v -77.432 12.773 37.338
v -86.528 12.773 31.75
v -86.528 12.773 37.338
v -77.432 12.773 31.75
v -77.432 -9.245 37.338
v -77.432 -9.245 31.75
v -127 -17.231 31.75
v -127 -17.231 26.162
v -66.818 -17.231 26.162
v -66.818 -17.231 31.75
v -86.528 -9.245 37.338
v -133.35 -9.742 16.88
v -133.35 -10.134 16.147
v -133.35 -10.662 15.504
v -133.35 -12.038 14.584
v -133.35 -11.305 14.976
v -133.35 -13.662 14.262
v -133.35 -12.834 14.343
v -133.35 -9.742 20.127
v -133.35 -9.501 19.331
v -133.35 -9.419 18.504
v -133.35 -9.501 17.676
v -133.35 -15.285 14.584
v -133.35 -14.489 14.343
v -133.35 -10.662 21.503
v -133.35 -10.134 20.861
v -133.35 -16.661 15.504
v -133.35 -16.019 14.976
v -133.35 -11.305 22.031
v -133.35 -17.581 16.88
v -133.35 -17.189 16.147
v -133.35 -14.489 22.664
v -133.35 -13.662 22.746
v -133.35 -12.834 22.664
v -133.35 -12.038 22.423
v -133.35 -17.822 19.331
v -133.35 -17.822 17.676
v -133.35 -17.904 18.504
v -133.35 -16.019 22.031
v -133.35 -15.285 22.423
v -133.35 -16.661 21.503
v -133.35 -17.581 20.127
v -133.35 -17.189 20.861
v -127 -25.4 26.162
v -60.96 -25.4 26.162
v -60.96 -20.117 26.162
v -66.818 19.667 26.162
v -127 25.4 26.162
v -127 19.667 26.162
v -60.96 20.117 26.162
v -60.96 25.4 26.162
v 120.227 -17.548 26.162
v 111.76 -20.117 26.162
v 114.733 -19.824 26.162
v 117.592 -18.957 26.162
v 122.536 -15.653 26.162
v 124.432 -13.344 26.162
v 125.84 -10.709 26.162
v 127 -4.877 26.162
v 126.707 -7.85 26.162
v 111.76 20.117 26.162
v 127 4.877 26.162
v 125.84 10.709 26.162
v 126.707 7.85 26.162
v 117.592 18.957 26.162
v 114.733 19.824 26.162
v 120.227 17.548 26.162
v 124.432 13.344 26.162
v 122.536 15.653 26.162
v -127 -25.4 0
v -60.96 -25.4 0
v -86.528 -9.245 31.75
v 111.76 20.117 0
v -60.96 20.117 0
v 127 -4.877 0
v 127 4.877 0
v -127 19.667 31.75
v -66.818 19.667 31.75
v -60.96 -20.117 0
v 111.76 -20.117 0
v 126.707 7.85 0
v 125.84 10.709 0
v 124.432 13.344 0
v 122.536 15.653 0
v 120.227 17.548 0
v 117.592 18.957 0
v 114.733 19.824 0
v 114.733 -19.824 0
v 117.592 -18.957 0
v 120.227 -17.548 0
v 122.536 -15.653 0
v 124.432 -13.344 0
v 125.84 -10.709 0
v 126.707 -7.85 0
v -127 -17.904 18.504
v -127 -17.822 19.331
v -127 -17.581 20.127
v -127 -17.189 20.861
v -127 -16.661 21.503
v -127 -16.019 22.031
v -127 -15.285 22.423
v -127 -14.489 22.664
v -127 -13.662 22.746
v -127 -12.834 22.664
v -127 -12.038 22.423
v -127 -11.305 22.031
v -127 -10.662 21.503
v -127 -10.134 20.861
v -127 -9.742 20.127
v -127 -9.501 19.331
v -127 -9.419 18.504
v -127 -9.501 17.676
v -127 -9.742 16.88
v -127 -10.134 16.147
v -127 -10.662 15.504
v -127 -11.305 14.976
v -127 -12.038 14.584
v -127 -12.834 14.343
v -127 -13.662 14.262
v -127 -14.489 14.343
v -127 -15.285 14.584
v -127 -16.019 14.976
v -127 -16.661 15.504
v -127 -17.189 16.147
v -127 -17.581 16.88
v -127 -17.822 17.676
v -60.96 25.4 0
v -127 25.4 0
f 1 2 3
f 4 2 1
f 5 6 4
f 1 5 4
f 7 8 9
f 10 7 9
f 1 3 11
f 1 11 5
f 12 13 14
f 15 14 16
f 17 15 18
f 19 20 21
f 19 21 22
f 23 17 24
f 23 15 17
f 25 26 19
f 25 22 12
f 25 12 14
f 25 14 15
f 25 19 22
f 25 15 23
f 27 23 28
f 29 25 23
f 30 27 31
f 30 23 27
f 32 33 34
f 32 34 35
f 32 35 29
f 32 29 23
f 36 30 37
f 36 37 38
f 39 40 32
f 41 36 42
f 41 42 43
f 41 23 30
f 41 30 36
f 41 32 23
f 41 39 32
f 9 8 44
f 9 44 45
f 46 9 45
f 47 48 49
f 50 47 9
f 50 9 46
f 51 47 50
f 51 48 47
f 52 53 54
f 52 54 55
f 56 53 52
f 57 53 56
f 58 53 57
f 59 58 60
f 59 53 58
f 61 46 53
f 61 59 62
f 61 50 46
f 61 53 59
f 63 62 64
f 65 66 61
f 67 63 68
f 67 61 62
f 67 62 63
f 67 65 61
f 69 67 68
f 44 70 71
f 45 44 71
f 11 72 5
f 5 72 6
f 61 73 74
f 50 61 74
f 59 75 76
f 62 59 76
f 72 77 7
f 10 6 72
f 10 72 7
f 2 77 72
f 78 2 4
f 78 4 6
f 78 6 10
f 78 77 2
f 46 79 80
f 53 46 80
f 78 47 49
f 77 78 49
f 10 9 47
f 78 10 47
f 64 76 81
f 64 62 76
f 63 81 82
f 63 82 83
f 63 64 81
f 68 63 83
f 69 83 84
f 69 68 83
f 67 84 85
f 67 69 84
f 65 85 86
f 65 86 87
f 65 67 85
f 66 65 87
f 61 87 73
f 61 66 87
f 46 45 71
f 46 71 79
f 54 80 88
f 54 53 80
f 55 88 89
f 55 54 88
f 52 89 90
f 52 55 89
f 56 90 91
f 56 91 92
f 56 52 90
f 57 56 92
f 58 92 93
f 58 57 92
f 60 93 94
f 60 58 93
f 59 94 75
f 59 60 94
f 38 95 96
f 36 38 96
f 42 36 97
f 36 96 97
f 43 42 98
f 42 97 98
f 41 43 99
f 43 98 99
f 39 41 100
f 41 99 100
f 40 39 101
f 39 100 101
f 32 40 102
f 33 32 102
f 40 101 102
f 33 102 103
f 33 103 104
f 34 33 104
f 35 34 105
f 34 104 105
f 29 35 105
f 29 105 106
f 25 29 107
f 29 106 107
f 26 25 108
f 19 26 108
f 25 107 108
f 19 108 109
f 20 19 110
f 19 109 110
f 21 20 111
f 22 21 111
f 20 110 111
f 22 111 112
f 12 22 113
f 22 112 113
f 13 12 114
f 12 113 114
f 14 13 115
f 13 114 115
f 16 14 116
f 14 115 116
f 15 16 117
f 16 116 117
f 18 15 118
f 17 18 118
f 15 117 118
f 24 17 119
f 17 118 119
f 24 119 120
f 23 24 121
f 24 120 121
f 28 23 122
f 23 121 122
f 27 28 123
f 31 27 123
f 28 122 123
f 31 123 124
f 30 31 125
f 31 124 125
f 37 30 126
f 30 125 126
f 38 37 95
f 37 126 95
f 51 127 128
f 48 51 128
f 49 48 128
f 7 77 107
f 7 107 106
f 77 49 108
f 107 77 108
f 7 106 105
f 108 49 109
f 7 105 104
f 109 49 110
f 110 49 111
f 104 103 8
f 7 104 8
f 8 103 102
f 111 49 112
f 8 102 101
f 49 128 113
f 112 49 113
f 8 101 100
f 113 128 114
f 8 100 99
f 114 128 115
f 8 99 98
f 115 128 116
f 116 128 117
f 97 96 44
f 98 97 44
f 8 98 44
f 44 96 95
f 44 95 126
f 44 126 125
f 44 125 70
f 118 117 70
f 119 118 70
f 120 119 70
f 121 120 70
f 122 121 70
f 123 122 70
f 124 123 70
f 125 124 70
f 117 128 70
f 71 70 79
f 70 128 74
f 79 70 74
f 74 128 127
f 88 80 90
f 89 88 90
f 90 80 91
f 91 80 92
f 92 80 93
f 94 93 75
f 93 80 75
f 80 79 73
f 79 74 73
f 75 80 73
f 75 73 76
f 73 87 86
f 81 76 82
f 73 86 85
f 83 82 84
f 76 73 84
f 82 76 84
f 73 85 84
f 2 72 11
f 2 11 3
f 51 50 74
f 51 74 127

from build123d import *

# Parameters (mm, degrees)
F1_DEPTH = 26.162
F2_R     = 4.242227
F3_DEPTH = 6.35
F5_DEPTH = 5.588
F6_W     = 9.096682
F6_H     = 22.018083
F7_DEPTH = 5.588
F8_R     = 15.24


with BuildPart() as f1:
    # F0 (on Top) → F1 (new body)
    with BuildSketch(Plane.XY):
        Polygon((-127, -25.4), (-60.96, -25.4), (-60.96, -20.1168), (127, -20.1168), (127, 20.1168), (-60.96, 20.1168), (-60.96, 25.4), (-127, 25.4), align=None)
    extrude(amount=F1_DEPTH)

    # F2 (on face) → F3 (join)
    with BuildSketch(Plane(origin=(-127, 0, 0), x_dir=(0, -1, 0), z_dir=(-1, 0, 0))):
        with Locations((13.661651, 18.503753)):
            Circle(F2_R)
    extrude(amount=F3_DEPTH)

    # F4 (on face) → F5 (join)
    with BuildSketch(Plane.XY.offset(26.162)):
        Polygon((-66.817649, 19.667143), (-127, 19.667143), (-127, -17.230507), (-66.817649, -17.230507), (-66.817649, 1.218318), align=None)
    extrude(amount=F5_DEPTH)

    # F6 (on face) → F7 (join)
    with BuildSketch(Plane.XY.offset(31.75)):
        with Locations((-81.979908, 1.763641)):
            Rectangle(F6_W, F6_H)
    extrude(amount=F7_DEPTH)

    # F8
    f8_edges = [f1.edges().sort_by_distance(p)[0] for p in [
        (127, -20.1168, 13.081),
        (127, 20.1168, 13.081),
    ]]
    fillet(f8_edges, radius=F8_R)


solid = f1.part
